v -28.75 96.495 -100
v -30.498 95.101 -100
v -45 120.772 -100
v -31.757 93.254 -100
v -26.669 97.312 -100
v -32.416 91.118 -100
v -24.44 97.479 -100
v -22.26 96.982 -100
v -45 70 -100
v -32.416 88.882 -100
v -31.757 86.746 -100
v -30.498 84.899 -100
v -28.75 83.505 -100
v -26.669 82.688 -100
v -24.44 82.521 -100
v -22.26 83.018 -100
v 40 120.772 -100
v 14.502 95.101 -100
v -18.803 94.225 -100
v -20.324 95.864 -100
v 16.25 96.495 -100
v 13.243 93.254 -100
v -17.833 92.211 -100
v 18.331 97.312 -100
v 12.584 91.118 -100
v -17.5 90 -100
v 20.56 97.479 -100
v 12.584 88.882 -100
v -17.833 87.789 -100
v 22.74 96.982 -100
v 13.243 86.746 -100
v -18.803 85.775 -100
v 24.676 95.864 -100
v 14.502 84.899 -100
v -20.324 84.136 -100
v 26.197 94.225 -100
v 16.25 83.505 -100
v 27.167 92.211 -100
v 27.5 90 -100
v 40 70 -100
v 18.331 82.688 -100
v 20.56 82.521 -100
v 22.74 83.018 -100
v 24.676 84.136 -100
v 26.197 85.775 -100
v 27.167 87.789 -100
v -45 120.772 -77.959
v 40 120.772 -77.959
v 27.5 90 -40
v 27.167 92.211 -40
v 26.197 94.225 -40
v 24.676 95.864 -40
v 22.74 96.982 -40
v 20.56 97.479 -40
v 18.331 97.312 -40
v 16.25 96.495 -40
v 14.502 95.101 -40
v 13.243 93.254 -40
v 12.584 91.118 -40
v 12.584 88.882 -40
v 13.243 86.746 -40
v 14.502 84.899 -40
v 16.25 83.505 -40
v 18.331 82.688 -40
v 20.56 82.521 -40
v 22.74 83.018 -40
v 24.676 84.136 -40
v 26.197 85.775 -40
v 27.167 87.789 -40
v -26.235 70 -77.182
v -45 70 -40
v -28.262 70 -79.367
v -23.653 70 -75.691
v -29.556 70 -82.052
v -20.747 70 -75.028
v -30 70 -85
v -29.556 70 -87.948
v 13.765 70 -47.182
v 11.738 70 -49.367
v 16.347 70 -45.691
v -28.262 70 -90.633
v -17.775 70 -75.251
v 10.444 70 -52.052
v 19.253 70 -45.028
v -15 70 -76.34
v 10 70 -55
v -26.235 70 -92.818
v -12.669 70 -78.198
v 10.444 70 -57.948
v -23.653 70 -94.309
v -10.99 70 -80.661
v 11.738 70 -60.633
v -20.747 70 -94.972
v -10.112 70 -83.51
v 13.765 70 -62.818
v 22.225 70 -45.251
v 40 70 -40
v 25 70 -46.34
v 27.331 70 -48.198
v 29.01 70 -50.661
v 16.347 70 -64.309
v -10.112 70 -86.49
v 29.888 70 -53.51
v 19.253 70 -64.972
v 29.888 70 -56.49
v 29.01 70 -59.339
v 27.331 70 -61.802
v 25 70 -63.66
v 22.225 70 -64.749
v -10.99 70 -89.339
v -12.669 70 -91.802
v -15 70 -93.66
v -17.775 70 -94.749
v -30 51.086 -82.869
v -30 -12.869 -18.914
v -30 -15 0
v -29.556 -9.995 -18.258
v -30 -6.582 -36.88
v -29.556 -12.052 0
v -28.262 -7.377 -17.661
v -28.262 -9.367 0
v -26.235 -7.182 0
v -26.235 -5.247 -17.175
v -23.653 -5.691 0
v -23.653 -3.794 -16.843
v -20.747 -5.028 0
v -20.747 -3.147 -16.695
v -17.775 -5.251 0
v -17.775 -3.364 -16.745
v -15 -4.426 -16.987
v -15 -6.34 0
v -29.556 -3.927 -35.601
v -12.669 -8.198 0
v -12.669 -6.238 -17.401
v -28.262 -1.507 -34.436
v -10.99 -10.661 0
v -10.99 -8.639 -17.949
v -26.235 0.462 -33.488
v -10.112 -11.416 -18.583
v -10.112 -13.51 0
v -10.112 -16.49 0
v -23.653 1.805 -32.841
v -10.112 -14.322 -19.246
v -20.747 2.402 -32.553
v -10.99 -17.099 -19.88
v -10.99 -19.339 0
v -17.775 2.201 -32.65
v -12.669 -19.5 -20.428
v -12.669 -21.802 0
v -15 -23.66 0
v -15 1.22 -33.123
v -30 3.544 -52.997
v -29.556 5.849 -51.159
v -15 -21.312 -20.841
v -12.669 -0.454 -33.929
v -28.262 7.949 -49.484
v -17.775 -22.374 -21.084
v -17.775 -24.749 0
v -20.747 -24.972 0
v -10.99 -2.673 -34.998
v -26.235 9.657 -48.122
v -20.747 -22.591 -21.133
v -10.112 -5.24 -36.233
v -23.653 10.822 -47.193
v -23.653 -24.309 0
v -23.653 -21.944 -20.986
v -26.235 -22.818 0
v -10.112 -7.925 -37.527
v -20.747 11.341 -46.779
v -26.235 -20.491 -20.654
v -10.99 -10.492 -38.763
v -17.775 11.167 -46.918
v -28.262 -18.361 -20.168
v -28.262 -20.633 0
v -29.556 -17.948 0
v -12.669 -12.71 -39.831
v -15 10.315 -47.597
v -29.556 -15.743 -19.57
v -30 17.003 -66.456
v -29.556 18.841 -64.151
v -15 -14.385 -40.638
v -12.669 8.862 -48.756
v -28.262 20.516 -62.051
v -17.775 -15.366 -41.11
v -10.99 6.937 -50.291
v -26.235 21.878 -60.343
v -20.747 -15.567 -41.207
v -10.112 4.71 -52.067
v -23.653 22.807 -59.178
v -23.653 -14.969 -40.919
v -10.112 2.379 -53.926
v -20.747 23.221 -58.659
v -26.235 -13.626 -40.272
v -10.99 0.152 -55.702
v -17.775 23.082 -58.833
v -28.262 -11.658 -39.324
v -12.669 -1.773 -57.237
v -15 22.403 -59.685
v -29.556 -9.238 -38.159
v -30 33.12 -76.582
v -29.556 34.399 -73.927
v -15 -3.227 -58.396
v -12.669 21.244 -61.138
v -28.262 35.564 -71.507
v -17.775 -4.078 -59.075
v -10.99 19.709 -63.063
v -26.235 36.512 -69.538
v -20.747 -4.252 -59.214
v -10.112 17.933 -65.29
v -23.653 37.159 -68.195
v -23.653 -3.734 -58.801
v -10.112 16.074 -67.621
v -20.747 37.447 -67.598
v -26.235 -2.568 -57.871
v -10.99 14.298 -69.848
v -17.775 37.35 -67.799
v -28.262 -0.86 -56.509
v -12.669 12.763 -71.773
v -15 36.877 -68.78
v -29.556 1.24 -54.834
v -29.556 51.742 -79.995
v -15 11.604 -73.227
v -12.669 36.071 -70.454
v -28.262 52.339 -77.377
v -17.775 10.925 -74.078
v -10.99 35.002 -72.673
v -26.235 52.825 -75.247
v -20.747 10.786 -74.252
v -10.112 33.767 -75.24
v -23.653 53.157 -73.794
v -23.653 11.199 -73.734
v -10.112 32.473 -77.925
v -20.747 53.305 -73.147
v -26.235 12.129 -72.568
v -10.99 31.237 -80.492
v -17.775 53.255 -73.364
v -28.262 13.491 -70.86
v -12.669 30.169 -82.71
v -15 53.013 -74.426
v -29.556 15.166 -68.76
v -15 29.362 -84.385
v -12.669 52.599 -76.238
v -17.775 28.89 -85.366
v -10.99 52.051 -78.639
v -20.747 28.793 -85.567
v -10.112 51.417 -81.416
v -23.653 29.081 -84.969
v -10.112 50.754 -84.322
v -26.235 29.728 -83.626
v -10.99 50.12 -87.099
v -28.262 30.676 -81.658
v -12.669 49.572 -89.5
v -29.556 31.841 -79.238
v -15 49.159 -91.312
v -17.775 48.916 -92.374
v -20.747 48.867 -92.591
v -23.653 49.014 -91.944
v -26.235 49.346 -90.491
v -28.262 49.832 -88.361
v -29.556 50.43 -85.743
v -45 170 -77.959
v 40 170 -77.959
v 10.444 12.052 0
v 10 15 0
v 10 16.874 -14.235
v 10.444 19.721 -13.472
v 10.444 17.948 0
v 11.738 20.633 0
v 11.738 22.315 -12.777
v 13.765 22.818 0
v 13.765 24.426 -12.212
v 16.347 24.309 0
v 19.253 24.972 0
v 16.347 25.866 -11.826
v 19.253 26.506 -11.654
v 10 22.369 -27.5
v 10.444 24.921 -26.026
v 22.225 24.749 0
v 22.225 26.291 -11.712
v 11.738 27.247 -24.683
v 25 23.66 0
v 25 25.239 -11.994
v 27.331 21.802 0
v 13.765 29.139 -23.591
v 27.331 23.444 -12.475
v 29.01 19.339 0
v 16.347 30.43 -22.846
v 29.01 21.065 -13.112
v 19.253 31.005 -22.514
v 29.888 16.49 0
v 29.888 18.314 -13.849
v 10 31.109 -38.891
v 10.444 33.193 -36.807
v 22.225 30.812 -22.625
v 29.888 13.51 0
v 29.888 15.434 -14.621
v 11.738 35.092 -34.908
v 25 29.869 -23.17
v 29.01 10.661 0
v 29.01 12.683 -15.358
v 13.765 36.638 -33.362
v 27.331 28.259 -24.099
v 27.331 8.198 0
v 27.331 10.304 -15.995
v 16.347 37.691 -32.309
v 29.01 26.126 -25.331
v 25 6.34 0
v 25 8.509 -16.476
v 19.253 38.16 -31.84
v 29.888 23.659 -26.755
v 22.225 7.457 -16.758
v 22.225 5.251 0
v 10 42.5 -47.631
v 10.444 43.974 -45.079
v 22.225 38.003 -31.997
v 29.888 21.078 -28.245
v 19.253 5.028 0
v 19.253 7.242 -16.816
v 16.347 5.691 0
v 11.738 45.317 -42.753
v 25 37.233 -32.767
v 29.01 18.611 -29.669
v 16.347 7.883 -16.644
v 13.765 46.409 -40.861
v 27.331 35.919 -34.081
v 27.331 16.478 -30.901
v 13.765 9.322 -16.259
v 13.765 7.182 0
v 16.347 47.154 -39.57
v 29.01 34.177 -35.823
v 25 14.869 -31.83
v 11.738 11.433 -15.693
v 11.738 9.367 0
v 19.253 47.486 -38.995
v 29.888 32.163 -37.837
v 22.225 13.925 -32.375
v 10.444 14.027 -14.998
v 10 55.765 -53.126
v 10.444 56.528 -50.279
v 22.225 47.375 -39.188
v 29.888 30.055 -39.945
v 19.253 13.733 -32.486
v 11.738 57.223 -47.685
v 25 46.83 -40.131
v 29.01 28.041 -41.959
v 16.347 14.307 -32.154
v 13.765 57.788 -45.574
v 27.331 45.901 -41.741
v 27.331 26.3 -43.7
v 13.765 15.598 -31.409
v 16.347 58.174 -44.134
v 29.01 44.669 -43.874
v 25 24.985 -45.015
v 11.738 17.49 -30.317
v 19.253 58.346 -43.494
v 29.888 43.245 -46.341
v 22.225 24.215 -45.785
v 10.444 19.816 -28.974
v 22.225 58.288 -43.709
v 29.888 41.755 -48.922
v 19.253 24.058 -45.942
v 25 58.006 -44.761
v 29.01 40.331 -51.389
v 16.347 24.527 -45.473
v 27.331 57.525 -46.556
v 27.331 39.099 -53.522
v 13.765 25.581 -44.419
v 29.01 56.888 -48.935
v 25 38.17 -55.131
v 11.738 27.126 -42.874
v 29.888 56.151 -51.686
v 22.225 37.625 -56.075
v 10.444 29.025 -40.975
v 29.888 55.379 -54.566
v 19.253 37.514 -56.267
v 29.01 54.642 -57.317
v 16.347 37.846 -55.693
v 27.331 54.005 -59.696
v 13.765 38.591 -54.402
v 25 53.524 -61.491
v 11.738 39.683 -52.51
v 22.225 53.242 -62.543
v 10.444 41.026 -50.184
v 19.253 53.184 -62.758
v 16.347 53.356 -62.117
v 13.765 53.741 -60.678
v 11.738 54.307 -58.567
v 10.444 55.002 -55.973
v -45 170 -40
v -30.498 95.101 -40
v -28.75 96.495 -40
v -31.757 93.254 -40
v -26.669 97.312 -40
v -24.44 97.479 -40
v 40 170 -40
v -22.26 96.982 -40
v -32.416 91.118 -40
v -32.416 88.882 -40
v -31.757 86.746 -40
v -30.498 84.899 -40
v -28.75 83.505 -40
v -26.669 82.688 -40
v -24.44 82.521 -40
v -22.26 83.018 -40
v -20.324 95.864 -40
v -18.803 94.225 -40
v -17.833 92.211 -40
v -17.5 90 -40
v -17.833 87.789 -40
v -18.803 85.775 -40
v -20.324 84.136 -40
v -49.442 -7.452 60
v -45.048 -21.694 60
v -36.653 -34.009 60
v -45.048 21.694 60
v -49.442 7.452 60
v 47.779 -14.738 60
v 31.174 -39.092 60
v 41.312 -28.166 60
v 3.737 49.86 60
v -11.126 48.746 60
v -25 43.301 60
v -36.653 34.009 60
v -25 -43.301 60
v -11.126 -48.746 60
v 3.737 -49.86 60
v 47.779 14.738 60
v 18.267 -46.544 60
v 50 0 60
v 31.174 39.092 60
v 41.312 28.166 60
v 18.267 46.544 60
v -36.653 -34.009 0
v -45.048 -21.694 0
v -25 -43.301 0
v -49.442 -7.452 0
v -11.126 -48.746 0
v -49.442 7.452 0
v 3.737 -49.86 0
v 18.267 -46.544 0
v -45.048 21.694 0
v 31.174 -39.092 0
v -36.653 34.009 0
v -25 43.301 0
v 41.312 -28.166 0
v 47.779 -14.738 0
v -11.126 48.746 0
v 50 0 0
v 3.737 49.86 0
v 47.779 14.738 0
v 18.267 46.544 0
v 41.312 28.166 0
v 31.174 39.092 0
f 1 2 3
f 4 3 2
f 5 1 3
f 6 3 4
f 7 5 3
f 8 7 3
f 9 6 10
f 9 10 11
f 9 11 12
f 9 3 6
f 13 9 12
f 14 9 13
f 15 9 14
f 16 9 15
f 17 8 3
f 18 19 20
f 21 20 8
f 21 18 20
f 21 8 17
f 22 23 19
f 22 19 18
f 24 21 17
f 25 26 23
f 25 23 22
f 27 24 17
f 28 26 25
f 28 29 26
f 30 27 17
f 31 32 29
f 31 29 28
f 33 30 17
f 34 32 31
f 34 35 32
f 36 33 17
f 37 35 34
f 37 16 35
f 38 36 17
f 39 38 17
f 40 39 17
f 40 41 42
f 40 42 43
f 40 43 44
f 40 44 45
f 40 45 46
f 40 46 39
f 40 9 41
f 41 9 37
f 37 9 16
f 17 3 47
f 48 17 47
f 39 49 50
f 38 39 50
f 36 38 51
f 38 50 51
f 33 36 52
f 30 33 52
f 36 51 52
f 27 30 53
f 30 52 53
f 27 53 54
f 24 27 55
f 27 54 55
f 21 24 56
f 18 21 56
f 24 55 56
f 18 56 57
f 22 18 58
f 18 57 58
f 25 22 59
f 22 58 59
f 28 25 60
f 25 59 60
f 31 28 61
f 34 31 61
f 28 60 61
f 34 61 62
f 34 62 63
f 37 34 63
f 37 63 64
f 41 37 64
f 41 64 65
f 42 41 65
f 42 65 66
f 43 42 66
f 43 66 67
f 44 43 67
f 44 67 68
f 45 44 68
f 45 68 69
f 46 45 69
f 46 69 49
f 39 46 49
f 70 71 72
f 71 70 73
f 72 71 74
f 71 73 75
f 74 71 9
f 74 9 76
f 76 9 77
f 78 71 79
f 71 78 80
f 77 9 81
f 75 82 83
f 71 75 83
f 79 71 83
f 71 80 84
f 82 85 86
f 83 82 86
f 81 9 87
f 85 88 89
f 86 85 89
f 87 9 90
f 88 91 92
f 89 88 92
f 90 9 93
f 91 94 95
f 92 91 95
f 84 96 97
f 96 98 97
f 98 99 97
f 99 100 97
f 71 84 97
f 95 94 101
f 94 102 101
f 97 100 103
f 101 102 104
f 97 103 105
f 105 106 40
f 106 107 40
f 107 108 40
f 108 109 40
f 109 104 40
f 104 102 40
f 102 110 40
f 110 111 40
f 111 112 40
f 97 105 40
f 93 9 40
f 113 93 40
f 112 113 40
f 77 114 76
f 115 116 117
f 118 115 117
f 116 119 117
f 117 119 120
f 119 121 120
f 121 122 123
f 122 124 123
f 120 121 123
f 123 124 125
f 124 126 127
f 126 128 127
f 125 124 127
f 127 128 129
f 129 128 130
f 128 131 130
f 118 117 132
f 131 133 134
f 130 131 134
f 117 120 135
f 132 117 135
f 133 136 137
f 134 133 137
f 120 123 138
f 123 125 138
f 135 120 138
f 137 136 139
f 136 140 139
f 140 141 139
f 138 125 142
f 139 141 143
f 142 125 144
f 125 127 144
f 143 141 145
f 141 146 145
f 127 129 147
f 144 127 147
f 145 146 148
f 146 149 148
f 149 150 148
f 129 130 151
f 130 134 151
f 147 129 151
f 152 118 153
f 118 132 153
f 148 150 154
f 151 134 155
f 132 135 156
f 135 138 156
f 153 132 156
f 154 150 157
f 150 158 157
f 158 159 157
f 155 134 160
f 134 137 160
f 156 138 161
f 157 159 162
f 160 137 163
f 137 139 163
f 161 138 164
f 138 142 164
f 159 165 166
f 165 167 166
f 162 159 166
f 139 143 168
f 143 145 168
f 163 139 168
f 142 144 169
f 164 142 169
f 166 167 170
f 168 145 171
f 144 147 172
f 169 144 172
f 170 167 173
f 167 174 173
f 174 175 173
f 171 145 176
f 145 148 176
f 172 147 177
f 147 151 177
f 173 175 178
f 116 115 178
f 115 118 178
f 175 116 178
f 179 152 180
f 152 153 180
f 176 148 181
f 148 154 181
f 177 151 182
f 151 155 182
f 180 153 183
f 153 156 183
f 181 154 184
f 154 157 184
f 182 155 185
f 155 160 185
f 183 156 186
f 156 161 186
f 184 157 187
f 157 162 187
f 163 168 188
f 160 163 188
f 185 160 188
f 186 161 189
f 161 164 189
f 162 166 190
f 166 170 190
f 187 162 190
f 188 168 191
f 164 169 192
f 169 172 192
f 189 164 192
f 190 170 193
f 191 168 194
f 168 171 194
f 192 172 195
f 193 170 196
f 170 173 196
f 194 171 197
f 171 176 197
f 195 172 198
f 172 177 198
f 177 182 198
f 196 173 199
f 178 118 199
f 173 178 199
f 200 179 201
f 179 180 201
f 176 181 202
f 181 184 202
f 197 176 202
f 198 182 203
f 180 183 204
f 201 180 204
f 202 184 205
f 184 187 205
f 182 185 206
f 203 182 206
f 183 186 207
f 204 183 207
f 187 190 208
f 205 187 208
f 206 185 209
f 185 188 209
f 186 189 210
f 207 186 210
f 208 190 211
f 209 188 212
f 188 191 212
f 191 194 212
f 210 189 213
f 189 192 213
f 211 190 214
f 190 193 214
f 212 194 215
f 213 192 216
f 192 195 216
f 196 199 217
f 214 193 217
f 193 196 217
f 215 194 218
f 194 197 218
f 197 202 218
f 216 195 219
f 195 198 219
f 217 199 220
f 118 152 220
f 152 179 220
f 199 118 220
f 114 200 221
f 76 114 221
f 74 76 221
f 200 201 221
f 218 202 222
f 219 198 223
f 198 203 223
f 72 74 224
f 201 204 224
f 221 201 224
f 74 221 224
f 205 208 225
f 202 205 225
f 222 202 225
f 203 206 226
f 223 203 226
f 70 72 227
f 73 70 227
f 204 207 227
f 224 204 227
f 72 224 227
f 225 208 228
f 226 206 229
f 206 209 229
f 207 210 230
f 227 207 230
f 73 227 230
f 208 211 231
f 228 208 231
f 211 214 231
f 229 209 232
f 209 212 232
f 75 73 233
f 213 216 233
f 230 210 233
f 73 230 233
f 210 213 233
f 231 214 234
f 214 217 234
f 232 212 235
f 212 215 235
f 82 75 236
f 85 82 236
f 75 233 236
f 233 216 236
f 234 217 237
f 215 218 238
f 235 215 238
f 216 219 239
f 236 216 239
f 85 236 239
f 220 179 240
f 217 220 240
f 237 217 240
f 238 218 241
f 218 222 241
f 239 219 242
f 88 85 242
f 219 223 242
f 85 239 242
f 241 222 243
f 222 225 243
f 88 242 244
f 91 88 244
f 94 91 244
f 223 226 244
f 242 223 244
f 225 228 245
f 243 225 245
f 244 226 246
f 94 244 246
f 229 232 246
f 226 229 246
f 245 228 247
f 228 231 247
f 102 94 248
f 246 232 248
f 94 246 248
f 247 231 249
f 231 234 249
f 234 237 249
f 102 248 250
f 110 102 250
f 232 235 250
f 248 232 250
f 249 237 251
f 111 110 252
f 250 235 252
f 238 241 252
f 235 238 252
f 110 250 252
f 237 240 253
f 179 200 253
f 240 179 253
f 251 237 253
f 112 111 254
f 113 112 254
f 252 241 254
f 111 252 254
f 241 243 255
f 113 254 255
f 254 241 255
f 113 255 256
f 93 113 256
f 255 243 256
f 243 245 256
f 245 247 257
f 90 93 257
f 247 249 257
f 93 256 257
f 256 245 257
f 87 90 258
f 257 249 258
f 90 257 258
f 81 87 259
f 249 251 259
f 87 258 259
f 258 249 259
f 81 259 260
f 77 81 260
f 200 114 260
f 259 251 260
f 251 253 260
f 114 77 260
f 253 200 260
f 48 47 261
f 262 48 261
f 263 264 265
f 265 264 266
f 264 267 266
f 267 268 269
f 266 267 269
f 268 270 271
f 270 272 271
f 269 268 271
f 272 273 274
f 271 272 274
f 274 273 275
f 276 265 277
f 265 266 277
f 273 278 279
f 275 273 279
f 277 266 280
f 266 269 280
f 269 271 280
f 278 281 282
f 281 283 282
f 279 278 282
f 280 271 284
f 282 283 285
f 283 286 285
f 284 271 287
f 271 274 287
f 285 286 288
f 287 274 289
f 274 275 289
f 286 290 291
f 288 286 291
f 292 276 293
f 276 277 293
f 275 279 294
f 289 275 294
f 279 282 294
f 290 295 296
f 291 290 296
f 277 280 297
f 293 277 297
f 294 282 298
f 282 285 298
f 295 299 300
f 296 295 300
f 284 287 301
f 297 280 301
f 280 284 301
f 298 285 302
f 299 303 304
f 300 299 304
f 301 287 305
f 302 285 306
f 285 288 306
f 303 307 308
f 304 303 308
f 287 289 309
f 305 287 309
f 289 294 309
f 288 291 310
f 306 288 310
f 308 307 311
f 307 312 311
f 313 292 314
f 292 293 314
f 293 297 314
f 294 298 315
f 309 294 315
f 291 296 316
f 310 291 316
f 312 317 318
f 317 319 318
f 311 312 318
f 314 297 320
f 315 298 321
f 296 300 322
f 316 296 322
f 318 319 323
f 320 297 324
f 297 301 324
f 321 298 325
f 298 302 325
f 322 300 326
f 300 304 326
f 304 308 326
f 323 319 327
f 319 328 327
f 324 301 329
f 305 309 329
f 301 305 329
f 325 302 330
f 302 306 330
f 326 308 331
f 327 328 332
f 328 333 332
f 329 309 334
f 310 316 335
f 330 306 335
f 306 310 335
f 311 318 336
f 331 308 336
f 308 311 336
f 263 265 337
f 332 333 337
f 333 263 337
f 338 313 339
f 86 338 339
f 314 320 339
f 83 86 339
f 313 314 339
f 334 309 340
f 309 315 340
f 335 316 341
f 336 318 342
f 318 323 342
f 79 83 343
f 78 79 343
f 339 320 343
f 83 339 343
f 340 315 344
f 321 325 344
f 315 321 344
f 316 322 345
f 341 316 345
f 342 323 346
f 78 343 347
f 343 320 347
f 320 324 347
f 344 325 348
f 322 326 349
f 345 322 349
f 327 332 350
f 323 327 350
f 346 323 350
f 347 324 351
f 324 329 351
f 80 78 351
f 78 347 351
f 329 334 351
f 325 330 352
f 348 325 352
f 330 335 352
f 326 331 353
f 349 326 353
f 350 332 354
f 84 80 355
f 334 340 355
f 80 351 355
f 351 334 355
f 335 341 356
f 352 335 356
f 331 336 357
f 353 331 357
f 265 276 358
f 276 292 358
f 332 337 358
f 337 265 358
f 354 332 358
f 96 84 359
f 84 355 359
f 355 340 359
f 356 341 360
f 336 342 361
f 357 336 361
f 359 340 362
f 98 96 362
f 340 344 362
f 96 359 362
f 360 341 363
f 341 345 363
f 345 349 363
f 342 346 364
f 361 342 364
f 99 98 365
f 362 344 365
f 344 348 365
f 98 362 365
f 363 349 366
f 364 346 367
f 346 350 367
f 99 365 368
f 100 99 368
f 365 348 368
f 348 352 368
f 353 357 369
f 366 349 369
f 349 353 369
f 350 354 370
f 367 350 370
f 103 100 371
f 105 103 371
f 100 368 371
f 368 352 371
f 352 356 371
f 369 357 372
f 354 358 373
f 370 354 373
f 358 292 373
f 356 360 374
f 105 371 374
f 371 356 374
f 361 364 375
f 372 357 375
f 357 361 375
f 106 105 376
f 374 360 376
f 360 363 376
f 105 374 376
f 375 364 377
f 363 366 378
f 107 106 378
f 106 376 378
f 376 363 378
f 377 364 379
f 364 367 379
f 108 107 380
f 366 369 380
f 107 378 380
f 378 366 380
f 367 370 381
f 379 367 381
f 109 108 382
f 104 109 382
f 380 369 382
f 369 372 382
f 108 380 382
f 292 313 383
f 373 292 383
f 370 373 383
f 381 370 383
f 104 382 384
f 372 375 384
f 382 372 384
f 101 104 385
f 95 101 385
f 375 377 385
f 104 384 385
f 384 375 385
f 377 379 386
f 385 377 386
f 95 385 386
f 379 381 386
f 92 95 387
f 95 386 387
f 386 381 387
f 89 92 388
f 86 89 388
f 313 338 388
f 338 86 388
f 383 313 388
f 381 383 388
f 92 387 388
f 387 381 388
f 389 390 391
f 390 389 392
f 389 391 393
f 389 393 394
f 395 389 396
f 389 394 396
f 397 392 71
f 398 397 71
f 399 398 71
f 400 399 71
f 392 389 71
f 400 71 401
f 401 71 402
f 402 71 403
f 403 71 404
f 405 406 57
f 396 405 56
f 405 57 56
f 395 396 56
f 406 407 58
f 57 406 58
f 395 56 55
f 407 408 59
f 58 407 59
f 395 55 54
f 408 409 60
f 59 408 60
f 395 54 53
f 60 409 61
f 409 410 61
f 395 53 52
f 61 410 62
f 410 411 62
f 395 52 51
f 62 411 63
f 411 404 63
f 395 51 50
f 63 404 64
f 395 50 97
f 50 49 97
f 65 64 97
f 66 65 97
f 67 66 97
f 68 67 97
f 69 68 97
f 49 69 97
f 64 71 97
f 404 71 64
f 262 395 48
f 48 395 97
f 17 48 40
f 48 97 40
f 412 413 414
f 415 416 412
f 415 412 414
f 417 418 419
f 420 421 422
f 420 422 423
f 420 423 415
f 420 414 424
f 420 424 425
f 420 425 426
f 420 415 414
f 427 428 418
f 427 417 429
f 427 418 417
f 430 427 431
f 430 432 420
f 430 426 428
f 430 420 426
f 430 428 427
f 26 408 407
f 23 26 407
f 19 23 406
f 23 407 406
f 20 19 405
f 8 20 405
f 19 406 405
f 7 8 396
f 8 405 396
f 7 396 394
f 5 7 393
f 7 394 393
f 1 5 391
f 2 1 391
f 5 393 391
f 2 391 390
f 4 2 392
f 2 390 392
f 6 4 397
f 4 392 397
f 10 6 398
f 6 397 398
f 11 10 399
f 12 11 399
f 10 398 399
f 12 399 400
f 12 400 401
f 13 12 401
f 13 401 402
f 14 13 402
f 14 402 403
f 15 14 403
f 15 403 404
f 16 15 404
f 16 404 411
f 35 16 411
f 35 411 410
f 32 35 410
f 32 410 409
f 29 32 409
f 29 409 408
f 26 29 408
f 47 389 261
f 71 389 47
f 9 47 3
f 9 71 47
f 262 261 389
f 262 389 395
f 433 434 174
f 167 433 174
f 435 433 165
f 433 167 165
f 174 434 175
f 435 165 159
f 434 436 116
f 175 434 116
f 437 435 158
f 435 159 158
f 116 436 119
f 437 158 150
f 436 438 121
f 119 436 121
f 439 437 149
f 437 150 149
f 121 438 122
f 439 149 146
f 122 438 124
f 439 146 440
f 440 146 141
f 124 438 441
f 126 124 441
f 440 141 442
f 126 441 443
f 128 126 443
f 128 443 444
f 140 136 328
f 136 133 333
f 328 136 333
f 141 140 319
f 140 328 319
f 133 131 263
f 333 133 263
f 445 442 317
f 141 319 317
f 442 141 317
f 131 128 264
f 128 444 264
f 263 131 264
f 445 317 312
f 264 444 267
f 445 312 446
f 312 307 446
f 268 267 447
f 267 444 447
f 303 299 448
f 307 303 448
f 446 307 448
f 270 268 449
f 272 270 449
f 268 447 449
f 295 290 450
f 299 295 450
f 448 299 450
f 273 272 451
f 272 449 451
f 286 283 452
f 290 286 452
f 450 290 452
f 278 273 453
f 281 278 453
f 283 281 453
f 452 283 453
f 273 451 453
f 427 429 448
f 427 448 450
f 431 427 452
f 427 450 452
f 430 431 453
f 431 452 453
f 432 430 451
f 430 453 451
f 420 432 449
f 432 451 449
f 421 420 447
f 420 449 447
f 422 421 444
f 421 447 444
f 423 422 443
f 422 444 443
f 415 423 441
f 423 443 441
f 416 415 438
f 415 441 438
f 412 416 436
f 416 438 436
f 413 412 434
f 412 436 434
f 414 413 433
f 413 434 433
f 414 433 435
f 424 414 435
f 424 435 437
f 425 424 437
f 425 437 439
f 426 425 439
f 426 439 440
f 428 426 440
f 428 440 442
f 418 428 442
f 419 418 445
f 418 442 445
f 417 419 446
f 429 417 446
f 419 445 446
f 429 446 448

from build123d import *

# Parameters (mm, degrees)
SKICA1_R                 = 50
P_IDAT_VYSUNUT_M1_DEPTH  = 60
SKICA2_R                 = 10
ROTOVAT1_ANGLE           = 90
SKICA3_W                 = 85
SKICA3_H                 = 60
P_IDAT_VYSUNUT_M2_DEPTH  = 100
SKICA4_W                 = 26.634802258
SKICA4_H                 = 52.894466455
ODEBRAT_VYSUNUT_M2_DEPTH = 100
SKICA5_R                 = 7.5
ODEBRAT_VYSUNUT_M3_DEPTH = 100


with BuildPart() as part:
    # Skica1 → Přidat vysunutím1 (new body)
    with BuildSketch(Plane.XY):
        Circle(SKICA1_R)
    extrude(amount=P_IDAT_VYSUNUT_M1_DEPTH)

    # Skica2 → Rotovat1 (revolve)
    with BuildSketch(Plane(origin=(0, 0, 0), x_dir=(-1, 0, 0), z_dir=(0, 0, -1))):
        with Locations((20, -15)):
            Circle(SKICA2_R)
        with Locations((-20, 15)):
            Circle(SKICA2_R)
    revolve(axis=Axis((-92.809652782, 70, 0), (1, 0, 0)), revolution_arc=ROTOVAT1_ANGLE)

    # Skica3 → Přidat vysunutím2 (add)
    with BuildSketch(Plane(origin=(0, 70, 0), x_dir=(1, 0, 0), z_dir=(0, 1, 0))):
        with Locations((-2.5, 70)):
            Rectangle(SKICA3_W, SKICA3_H)
    extrude(amount=P_IDAT_VYSUNUT_M2_DEPTH)

    # Skica4 → Odebrat vysunutím2 (cut)
    with BuildSketch(Plane.ZY.offset(45)):
        with Locations((-91.276231393, 147.219598942)):
            Rectangle(SKICA4_W, SKICA4_H)
    extrude(amount=-ODEBRAT_VYSUNUT_M2_DEPTH, mode=Mode.SUBTRACT)

    # Skica5 → Odebrat vysunutím3 (cut)
    with BuildSketch(Plane.XY.offset(-40)):
        with Locations((20, 90)):
            Circle(SKICA5_R)
        with Locations((-25, 90)):
            Circle(SKICA5_R)
    extrude(amount=-ODEBRAT_VYSUNUT_M3_DEPTH, mode=Mode.SUBTRACT)


solid = part.part
